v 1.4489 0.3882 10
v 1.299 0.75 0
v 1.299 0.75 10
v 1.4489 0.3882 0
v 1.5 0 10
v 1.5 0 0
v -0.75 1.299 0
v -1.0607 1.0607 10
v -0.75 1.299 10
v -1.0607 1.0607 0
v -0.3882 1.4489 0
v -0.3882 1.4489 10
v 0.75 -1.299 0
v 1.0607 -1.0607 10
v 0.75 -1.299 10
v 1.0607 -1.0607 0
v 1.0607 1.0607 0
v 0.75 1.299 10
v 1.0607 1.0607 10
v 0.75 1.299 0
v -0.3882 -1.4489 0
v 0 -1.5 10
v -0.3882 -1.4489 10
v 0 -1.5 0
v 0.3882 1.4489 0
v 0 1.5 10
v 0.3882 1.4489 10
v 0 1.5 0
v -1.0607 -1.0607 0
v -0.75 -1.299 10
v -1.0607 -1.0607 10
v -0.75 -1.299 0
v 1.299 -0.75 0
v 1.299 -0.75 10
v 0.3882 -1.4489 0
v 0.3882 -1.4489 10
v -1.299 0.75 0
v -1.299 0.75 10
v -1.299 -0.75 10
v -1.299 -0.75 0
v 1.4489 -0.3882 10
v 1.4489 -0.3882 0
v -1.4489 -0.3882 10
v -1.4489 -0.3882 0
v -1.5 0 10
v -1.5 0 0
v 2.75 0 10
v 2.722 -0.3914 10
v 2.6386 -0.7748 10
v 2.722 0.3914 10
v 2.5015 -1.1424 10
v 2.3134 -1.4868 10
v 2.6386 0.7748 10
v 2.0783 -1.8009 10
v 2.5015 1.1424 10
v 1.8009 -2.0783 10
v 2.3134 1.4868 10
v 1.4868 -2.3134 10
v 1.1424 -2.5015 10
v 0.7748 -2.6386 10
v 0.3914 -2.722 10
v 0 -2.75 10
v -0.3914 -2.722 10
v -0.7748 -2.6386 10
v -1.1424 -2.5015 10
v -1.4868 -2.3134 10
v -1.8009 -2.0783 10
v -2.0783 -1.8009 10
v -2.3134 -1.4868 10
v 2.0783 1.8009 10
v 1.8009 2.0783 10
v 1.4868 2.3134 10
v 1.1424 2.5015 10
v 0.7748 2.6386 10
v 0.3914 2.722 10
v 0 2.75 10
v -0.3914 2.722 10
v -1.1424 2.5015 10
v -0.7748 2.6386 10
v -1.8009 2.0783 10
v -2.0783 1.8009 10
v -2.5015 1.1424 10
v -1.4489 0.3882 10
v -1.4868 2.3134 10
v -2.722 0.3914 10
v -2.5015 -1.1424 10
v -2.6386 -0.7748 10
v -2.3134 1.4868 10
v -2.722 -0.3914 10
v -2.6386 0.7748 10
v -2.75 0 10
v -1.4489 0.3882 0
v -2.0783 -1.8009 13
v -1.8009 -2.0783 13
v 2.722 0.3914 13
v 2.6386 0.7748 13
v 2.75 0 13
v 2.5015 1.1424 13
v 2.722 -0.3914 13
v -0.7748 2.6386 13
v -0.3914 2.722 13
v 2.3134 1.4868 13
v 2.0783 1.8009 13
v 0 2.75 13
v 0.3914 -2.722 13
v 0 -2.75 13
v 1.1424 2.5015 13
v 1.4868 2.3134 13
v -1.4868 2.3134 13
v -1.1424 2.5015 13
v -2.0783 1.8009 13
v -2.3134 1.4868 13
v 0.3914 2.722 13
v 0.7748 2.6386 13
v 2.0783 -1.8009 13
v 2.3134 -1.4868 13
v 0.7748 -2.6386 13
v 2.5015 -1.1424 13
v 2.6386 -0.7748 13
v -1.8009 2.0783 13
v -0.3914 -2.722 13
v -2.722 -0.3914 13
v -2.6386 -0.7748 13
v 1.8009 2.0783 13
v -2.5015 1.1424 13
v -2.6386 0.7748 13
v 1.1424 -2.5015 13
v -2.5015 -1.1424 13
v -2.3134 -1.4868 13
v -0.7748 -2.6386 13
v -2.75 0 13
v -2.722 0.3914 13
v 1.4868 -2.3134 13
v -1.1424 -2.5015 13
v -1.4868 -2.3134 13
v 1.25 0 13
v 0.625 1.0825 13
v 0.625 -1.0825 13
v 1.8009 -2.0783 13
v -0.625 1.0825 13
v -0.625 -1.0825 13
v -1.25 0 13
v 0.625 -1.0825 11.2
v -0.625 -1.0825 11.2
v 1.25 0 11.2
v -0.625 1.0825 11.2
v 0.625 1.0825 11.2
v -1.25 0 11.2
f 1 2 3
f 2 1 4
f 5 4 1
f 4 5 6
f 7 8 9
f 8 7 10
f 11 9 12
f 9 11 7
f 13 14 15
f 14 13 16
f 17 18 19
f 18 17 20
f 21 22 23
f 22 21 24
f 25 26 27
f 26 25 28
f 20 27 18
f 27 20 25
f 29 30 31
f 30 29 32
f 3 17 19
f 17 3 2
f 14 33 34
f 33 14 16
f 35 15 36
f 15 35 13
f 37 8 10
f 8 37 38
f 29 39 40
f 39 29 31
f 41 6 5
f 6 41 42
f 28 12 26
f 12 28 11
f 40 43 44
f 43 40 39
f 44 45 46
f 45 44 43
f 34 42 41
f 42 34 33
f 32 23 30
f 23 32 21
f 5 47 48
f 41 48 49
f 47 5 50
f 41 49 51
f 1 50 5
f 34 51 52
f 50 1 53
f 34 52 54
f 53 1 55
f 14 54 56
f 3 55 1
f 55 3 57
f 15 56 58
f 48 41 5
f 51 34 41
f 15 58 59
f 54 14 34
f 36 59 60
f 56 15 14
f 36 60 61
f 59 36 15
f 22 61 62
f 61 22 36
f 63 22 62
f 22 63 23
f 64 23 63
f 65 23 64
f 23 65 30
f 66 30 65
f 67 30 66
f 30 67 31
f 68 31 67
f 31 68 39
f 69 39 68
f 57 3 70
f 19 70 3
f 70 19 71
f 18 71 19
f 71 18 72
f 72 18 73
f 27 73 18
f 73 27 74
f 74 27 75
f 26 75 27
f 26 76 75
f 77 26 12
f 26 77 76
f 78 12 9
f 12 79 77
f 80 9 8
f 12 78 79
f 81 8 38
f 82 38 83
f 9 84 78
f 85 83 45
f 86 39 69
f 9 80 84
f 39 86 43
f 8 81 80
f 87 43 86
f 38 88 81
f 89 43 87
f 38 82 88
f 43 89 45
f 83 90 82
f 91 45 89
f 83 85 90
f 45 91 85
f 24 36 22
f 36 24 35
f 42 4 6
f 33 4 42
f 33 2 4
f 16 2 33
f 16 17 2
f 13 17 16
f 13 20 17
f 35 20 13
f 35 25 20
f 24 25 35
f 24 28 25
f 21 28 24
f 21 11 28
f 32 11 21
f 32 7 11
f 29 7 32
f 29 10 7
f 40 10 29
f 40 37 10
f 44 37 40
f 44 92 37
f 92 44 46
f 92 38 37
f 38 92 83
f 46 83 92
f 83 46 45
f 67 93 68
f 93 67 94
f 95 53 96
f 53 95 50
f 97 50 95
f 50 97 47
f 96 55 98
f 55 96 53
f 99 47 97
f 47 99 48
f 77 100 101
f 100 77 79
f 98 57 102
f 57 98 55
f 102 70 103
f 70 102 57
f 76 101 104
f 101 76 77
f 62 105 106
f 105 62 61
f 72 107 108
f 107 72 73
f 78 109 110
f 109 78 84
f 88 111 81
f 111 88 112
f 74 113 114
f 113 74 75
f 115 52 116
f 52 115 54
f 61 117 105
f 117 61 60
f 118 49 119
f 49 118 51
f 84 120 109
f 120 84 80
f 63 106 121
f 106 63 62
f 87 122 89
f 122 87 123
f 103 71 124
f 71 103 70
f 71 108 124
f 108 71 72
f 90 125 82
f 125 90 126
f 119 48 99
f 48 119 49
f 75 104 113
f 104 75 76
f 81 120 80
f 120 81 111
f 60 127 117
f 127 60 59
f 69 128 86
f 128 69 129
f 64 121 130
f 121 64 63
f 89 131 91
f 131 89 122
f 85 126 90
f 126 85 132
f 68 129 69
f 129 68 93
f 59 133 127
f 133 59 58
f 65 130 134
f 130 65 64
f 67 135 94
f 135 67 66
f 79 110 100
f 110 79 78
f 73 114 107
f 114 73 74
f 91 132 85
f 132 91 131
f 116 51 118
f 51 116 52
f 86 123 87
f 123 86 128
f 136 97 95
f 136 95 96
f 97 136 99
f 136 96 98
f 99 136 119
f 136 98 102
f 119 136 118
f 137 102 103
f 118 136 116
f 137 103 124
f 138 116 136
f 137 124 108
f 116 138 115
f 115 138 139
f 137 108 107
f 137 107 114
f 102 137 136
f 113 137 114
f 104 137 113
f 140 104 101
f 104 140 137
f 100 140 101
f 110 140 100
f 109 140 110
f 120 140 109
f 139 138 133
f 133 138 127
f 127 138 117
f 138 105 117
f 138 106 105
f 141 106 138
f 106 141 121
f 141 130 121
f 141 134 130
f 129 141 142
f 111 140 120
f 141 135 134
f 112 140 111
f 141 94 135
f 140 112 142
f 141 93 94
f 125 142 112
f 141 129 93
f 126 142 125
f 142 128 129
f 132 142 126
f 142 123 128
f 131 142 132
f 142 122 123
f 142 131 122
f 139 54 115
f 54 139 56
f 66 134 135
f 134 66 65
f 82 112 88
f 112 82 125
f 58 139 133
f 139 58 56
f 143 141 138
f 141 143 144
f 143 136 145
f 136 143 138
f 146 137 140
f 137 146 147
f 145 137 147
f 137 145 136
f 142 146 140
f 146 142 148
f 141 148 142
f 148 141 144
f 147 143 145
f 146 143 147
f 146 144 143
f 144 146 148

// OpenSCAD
$fa = 2;
$fs = 0.4;

module m3_shcs() {
  color("#8a8a90")
    difference() {
      union() {
        cylinder(h = 10, d = 3);
        translate([0, 0, 10])
          cylinder(h = 3, d = 5.5);
      }
      translate([0, 0, 11.2])
        cylinder(h = 2.5, d = 2.5, $fn = 6);
    }
}

m3_shcs();
